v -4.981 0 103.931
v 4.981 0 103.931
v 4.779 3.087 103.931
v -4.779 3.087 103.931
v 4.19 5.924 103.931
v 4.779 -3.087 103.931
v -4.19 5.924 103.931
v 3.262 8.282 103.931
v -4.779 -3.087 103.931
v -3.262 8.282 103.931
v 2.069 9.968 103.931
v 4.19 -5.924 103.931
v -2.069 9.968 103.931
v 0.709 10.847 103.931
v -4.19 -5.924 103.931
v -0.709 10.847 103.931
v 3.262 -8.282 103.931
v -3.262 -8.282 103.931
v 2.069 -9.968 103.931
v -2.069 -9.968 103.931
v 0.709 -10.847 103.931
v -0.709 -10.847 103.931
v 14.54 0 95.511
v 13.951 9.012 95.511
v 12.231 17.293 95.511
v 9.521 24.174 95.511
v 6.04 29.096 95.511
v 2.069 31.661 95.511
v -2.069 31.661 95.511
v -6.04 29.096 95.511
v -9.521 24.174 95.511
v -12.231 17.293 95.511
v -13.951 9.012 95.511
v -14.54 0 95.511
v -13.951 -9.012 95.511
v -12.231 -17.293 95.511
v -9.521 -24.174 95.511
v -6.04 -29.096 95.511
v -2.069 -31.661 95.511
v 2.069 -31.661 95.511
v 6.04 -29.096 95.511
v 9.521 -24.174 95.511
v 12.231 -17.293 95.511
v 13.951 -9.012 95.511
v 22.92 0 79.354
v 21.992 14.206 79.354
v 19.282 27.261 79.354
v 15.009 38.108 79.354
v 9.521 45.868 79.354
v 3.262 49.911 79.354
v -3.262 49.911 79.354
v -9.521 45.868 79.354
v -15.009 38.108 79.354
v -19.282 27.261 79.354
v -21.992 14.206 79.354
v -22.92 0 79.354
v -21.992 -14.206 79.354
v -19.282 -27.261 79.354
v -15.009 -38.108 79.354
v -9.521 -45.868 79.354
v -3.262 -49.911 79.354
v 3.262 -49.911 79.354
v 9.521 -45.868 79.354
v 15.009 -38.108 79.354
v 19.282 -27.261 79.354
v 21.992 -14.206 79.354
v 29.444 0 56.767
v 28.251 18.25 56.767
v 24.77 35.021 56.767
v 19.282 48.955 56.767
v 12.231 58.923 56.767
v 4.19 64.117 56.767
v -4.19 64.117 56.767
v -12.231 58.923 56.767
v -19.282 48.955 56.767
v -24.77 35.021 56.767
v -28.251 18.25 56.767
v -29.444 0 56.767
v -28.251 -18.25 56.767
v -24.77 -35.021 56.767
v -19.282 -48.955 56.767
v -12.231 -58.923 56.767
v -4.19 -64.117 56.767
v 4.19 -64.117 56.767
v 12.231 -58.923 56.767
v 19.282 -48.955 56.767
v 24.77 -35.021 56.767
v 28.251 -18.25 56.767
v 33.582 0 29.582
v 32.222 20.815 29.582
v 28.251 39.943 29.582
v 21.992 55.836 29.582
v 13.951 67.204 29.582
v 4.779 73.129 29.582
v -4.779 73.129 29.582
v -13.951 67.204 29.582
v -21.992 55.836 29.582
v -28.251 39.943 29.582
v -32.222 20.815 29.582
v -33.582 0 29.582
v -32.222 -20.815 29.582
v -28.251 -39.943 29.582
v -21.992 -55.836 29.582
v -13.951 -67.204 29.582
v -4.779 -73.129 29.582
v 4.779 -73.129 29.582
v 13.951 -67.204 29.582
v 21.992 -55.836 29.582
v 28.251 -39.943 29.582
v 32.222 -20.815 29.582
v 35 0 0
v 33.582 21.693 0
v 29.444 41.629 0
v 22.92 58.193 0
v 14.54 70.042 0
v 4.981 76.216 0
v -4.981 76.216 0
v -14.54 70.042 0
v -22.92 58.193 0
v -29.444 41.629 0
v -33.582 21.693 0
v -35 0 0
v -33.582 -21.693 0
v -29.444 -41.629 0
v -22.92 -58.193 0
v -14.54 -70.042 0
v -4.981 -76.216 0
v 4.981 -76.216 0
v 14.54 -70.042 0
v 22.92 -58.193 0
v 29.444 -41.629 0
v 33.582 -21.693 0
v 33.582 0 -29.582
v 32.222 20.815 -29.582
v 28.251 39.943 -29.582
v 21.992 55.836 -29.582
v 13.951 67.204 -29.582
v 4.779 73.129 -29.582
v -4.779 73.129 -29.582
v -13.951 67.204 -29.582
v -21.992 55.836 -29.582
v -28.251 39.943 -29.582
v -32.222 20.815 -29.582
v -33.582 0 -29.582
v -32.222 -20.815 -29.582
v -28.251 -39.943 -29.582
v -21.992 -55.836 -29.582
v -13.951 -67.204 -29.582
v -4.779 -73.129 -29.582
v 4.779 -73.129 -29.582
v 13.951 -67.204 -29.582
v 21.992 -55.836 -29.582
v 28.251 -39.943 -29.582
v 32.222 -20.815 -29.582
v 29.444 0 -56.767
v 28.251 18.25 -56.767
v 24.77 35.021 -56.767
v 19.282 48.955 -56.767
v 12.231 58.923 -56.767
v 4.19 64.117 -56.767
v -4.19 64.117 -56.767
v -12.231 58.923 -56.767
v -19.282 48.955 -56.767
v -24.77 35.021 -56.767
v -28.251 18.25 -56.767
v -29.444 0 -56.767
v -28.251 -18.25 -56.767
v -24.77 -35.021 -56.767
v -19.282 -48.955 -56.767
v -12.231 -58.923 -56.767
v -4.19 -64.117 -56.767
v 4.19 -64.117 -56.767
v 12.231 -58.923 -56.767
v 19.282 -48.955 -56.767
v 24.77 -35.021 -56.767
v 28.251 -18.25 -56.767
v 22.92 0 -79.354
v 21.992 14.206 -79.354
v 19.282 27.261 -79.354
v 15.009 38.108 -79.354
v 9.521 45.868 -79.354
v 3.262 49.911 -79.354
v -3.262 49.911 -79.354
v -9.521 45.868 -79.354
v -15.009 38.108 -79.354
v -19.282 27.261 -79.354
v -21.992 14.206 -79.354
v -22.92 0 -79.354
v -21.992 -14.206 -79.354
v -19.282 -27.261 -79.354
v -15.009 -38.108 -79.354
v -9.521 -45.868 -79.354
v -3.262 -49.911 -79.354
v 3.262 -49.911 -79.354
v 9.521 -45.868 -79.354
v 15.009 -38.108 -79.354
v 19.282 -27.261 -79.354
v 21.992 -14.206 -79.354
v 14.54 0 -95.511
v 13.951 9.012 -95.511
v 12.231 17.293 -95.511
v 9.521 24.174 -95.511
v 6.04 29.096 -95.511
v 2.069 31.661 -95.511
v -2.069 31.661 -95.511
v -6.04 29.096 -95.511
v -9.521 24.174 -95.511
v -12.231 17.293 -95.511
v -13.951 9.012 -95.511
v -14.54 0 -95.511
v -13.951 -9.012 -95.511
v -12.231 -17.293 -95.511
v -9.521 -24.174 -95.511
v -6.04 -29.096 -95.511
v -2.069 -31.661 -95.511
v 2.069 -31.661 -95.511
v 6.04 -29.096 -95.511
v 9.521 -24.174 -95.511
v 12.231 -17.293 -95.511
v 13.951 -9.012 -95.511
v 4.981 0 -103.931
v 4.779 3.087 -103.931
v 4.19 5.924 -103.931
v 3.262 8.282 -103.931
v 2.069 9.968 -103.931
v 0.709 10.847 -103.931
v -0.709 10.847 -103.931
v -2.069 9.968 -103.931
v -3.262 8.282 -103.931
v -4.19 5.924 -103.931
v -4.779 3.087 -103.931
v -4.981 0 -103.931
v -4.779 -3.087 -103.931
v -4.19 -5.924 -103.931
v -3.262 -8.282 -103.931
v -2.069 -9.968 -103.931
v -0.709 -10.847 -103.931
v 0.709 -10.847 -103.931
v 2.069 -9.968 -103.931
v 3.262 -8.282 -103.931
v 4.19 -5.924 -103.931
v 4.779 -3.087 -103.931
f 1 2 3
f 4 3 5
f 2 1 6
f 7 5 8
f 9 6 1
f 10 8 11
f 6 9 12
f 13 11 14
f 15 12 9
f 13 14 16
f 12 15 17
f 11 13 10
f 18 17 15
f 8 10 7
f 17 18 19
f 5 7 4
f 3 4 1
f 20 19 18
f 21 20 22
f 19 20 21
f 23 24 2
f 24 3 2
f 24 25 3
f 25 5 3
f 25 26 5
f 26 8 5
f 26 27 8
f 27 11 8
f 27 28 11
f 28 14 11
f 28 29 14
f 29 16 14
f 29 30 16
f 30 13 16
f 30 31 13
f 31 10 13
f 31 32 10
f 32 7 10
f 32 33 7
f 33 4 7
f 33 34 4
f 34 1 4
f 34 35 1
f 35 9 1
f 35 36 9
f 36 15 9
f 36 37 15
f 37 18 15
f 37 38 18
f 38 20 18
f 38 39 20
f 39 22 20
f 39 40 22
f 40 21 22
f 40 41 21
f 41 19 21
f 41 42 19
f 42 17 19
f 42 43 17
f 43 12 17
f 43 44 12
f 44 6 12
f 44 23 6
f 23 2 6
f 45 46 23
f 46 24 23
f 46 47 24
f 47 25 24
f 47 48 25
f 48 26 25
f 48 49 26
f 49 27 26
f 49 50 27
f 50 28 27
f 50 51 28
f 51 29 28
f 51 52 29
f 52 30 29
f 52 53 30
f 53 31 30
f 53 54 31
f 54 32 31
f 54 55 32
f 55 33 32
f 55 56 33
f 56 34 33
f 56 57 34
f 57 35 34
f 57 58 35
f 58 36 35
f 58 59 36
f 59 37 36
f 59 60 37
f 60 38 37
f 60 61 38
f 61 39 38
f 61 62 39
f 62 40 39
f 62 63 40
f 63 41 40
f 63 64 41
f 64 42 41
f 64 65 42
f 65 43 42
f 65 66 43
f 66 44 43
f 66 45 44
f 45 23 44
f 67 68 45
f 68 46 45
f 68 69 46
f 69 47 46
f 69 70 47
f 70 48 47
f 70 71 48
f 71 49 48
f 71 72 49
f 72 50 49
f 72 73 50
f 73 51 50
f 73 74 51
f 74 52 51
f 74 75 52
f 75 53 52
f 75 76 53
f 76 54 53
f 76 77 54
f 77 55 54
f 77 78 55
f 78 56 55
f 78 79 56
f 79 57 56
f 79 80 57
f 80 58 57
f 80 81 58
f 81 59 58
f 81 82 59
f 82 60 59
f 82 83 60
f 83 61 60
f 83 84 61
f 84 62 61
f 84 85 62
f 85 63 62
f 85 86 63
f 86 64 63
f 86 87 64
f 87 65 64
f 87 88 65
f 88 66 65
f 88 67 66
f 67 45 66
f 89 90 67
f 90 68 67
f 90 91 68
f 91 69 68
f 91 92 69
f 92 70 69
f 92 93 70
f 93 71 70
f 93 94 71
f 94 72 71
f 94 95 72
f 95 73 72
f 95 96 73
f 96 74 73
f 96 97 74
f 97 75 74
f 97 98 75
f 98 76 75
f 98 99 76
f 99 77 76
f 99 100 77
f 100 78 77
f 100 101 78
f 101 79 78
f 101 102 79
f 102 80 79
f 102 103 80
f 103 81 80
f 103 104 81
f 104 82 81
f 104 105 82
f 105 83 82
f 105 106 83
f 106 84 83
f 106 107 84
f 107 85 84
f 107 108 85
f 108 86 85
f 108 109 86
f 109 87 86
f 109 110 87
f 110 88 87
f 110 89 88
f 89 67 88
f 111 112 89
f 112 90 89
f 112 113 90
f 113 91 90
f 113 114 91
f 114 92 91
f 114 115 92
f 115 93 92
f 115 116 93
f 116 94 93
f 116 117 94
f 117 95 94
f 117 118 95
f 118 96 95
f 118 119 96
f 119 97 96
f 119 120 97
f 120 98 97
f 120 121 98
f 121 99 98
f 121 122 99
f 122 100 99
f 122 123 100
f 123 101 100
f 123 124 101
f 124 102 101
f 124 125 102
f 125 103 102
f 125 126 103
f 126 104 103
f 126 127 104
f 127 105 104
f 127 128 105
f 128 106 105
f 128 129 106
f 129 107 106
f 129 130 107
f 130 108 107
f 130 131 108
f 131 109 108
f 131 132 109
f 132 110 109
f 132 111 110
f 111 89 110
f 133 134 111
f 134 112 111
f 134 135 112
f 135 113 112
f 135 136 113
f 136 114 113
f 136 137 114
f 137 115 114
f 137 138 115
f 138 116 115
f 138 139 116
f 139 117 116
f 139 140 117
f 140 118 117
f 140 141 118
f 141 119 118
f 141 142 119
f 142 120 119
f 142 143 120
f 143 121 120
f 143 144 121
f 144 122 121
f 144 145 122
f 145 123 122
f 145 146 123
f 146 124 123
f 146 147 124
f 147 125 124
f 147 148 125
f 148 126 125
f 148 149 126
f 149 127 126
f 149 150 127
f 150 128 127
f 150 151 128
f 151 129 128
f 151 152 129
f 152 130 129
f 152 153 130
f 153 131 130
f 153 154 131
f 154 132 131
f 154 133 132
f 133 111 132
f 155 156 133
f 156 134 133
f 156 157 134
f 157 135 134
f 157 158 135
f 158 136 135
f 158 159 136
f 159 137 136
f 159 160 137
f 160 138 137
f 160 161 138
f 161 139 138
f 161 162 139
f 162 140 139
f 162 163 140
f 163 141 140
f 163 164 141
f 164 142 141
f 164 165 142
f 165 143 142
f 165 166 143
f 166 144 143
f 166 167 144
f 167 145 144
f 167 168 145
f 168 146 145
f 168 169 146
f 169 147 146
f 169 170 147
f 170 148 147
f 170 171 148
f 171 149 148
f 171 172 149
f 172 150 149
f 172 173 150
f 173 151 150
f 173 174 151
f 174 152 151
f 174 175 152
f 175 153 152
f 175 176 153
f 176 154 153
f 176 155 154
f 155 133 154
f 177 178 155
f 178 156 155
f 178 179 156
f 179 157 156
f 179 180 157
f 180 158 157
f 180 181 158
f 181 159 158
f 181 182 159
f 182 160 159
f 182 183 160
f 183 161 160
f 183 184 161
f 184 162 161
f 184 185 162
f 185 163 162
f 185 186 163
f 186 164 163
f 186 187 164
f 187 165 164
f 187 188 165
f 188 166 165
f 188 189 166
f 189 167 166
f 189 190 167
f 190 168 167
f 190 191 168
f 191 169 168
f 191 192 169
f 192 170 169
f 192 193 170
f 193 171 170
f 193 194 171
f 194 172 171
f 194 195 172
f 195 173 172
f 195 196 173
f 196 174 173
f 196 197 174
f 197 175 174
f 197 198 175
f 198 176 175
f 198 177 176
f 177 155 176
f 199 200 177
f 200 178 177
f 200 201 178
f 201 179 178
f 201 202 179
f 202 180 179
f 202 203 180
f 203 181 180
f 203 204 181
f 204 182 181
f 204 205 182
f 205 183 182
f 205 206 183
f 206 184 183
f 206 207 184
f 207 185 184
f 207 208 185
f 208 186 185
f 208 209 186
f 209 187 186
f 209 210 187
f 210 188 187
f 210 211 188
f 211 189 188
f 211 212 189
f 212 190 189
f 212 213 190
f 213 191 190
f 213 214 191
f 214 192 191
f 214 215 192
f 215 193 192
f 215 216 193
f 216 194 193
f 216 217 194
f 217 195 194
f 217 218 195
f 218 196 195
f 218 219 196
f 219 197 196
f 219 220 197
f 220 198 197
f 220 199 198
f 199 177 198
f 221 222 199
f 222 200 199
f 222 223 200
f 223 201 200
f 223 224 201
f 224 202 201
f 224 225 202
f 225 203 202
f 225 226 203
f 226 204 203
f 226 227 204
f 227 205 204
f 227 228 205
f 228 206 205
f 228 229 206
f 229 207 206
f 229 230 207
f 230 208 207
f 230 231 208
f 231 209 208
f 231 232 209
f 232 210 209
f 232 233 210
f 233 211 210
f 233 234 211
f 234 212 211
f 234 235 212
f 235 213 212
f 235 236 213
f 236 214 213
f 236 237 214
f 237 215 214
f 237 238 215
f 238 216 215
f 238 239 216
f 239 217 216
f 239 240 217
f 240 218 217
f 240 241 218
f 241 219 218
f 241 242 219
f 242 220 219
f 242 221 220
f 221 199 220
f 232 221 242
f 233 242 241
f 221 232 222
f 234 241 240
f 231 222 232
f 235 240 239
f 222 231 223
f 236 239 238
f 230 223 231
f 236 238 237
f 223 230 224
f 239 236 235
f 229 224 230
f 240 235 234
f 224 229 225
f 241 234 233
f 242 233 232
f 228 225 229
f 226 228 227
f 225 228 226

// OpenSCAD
// Generated by SolidPython 1.0.1 on 2020-07-29 00:46:46


scale(v = [5, 11, 15]) {
	sphere(r = 7);
}
/***********************************************
*********      SolidPython code:      **********
************************************************
 
# import packages: SolidPython
from solid import *
from solid.utils import *
from itertools import chain, combinations, permutations


class Resize:

    def __init__(self, scad_file):
        self.scad_file = scad_file
        #self.scad_file = import_scad(scad_file)
        # cone/cylinder param:
        self.r1 = 0
        self.r2 = 0
        self.h = 0
        # rectangular prism param:
        self.w = 0
        self.l = 0
        # ellipse param:
        self.r = 0

    # import OpenScad code (file name corresponds to shape)


    # classify shape + parameters
    def assign(self, param1, param2, param3):
        if self.scad_file == 'cone.scad':
            self.r1 = param1
            self.r2 = param2
            self.h = param3
        elif self.scad_file == 'cylinder.scad':
            self.r1 = param1
            self.r2 = param2
            self.h = param3
        elif self.scad_file == 'rectangularPrism.scad':
            self.h = param1
            self.l = param2
            self.w = param3
        else:
            self.r = param1
            self.h = param2

    # resize parameters
    def iterate(self):
        x = range(3, 20, 2)
        i = 1
        if self.scad_file == 'cone.scad':
            tempList = list(permutations(x, 2))
            for temp in tempList:
                param1 = temp[0]
                param2 = temp[1]
                filepath = 'produced_scad_files/' + 'cone' + str(param1) + '_' + str(param2) + '_' + '.scad'
                scad_render_to_file(cylinder(h=param1, r1=param2, r2=0), filepath)

        elif self.scad_file == 'cylinder.scad':
            tempList = list(permutations(x, 3))
            for temp in tempList:
                param1 = temp[0]
                param2 = temp[1]
                filepath = 'produced_scad_files/' + 'cylinder' + str(param1) + '_' + str(param2) + '_' + '.scad'
                scad_render_to_file(cylinder(h=param1, r1=param2, r2=param2), filepath)

        elif self.scad_file == 'rectangularPrism.scad':
            tempList = list(permutations(x, 3))
            for temp in tempList:
                param1 = temp[0]
                param2 = temp[1]
                param3 = temp[2]
                filepath = 'produced_scad_files/' + 'rectangularPrism' + str(param1) + '_' + str(param2) + '_' + str(
                    param3) + '.scad'
                scad_render_to_file(cube(size=(param1, param2, param3)), filepath)

        elif self.scad_file == 'ellipse.scad':
            tempList = list(permutations(x, 4))
            for temp in tempList:
                param1 = temp[0]
                param2 = temp[1]
                param3 = temp[2]
                param4 = temp[3]
                filepath = 'produced_scad_files/' + 'ellipse' + str(param1) + '_' + str(param2) + '_' + str(param3) + '_' + str(param4) + '.scad'
                scad_render_to_file(scale([param1, param2, param3])(sphere(r=param4)), filepath)

    def render_to_scadfile(self):
        scad_render_to_file(scad, 'example.scad') 
 
************************************************/
